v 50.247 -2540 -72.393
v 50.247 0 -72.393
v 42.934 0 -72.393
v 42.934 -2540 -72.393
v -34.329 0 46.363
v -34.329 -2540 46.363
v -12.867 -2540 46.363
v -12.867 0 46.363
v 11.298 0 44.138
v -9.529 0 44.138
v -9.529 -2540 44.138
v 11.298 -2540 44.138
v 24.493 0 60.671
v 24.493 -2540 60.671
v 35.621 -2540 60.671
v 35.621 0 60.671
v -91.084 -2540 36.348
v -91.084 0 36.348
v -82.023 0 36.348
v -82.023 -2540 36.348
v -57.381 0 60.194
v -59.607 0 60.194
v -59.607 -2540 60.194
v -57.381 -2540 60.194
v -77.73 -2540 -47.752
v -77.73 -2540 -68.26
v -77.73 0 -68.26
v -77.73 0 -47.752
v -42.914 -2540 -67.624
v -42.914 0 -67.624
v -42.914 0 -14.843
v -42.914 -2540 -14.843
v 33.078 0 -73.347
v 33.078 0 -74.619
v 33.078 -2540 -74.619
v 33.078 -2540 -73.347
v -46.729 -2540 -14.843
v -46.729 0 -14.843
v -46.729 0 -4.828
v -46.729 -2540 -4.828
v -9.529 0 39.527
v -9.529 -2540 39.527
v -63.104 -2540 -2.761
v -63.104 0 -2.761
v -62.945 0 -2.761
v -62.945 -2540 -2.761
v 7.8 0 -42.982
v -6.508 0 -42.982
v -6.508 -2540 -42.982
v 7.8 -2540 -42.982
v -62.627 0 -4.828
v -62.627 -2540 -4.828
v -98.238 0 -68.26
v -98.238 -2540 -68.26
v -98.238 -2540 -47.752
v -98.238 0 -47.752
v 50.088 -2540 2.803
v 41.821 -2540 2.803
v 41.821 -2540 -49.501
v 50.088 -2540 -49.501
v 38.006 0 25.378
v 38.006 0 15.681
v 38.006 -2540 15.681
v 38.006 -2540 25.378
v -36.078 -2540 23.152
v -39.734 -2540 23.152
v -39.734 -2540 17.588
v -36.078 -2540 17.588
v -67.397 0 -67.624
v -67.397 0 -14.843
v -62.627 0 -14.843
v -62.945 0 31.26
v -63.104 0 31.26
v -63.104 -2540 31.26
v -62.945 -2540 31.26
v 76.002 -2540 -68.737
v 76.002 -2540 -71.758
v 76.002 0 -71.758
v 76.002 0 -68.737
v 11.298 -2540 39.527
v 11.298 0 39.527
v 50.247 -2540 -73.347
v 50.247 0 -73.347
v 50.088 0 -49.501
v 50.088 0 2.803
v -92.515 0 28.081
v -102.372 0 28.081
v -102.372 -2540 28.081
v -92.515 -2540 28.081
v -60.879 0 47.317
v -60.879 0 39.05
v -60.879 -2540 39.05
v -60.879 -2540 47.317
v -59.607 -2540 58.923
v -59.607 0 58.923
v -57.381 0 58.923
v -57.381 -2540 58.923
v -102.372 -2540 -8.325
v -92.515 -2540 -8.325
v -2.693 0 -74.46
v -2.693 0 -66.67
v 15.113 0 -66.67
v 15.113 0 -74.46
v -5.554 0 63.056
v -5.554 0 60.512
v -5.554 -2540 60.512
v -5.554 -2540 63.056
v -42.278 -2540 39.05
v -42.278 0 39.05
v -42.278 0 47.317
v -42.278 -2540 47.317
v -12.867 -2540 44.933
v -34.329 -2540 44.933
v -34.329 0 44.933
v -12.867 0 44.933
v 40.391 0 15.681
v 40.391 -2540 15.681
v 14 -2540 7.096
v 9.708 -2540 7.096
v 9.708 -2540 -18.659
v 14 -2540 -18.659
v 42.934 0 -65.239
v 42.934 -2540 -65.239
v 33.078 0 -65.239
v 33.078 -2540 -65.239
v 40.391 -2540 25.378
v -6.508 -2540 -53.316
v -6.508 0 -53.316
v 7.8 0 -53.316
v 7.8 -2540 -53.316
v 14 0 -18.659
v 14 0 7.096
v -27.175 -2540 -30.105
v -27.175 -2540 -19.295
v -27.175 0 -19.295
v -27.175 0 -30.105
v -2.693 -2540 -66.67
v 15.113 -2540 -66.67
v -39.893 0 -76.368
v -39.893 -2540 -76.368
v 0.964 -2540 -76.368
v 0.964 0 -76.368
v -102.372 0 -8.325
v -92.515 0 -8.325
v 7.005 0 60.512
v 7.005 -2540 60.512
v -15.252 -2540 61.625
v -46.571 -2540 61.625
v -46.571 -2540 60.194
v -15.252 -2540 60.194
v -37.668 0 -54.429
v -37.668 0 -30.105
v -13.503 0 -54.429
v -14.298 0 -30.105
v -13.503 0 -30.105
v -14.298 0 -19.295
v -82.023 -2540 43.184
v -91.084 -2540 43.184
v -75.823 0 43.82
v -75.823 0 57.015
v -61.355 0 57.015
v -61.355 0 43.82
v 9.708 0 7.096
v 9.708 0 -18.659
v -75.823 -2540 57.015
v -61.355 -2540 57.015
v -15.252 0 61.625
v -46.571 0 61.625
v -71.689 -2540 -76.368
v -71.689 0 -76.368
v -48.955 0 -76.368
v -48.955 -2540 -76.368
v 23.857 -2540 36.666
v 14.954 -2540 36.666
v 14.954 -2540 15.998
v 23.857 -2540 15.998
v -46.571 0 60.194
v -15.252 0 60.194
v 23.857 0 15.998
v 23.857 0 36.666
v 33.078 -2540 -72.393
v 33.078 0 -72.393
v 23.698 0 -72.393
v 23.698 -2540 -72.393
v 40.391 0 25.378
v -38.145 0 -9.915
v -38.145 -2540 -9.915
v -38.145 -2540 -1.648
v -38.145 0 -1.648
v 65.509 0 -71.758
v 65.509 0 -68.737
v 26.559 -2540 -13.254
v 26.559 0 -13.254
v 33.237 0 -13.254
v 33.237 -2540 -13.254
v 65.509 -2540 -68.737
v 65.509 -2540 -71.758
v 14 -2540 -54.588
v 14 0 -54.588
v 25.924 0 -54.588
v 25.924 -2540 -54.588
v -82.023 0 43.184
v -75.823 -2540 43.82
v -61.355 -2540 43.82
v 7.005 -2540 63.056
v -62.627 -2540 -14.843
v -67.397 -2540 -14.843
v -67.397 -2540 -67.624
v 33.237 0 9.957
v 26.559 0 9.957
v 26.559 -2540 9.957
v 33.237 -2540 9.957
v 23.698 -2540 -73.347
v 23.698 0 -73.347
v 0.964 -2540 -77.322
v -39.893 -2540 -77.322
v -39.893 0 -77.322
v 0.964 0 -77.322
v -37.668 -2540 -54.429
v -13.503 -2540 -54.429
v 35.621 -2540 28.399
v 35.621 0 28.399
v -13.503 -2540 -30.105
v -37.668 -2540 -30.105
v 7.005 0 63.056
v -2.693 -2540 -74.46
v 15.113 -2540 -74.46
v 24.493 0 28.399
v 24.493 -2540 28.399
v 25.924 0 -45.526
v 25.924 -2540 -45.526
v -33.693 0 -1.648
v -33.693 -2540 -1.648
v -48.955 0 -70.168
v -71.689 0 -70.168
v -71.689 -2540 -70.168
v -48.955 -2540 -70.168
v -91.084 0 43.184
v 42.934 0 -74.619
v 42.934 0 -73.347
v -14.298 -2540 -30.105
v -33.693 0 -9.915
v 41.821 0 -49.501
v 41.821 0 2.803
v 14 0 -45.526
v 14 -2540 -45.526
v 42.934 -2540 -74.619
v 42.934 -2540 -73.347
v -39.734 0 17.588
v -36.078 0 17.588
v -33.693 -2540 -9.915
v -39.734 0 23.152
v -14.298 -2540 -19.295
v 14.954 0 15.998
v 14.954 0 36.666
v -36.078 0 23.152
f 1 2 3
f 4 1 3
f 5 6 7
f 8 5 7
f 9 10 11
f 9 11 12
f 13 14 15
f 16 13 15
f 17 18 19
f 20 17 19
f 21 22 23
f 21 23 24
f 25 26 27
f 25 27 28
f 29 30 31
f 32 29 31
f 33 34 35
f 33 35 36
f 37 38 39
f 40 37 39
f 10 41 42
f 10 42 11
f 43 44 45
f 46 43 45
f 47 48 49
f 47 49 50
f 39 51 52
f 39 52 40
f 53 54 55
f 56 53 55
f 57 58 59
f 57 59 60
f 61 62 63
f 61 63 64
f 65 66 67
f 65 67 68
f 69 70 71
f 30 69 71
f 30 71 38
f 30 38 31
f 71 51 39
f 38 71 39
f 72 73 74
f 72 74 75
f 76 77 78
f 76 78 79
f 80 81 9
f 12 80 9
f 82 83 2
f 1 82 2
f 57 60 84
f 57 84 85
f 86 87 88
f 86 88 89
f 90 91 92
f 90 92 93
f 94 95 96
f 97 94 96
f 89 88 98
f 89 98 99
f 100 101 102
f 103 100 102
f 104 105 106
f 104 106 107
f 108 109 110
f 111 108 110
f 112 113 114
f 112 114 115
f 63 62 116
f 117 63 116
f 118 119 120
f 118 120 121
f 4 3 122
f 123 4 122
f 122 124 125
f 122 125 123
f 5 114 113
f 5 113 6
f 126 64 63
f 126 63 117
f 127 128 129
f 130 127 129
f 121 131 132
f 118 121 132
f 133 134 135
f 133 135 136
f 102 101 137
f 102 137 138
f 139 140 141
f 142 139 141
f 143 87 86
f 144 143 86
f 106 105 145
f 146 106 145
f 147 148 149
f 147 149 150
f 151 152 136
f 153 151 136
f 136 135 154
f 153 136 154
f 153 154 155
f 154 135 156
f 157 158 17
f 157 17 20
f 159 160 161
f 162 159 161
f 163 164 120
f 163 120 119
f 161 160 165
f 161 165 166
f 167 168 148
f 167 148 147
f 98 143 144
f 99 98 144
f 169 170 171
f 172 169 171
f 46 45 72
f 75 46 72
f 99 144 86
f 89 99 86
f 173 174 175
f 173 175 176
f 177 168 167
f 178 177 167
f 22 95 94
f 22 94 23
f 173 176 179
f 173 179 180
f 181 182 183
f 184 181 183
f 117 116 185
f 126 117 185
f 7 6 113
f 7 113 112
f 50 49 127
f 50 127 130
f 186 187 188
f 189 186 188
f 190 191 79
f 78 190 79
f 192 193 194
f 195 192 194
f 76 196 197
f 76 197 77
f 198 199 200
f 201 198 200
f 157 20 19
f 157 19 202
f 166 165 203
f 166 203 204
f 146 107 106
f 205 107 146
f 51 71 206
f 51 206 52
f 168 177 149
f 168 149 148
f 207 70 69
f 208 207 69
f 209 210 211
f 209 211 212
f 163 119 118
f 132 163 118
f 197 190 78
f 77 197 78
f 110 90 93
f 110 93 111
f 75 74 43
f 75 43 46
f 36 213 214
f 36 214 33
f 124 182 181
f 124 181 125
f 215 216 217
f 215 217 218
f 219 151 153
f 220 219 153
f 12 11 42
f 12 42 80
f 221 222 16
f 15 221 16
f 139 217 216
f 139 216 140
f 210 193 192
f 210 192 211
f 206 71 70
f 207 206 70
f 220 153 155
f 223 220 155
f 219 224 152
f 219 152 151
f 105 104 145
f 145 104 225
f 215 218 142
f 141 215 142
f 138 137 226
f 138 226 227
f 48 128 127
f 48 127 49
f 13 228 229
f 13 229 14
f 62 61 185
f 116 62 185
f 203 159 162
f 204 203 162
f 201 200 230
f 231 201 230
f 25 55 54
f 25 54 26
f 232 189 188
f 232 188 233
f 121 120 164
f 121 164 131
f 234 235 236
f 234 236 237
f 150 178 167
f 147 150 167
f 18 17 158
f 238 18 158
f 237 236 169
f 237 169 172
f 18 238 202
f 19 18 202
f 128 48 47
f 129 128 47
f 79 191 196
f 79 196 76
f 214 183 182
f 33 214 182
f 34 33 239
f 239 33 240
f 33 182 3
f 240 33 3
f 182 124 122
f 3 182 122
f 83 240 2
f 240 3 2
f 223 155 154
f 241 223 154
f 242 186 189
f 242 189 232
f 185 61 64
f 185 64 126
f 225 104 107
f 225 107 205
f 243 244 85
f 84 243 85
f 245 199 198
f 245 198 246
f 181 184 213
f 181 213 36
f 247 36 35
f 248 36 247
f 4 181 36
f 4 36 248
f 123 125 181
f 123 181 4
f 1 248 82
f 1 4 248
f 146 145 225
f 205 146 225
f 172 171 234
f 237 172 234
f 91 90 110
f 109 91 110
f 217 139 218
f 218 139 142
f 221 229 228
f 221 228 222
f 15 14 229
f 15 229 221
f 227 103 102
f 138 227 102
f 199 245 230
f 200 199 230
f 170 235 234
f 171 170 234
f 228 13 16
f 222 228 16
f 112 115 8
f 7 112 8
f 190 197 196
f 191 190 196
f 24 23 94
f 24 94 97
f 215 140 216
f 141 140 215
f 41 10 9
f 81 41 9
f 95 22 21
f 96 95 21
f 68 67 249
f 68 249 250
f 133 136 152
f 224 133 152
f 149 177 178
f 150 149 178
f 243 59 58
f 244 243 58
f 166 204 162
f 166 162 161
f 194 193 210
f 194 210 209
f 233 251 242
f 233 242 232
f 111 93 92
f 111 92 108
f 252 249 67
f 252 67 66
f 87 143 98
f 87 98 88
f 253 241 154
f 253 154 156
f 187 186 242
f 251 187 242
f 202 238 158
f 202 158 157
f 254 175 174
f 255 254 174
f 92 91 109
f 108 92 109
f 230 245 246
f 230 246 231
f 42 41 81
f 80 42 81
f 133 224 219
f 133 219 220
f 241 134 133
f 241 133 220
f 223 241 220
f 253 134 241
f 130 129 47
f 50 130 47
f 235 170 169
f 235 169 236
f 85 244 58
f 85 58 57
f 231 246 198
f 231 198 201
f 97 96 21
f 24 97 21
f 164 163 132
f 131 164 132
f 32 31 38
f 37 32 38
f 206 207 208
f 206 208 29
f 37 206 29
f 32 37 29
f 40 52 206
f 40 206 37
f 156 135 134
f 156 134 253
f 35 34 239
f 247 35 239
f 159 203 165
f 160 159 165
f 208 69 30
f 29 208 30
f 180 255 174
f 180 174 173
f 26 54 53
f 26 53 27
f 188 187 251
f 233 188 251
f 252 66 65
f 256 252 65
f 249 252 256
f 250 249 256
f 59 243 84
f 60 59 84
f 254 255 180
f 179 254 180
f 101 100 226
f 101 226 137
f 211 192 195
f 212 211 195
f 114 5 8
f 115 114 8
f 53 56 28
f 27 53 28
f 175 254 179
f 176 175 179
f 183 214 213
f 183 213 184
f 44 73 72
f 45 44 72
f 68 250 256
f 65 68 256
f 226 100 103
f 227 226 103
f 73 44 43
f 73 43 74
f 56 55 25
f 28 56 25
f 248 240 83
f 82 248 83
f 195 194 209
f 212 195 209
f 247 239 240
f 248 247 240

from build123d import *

# Parameters (mm, degrees)
F0_W     = 15.897821635
F0_H     = 10.0156273693
F0_H_2   = 5.2462806925
F1_DEPTH = 2540
F0_W_2   = 4.2924117297
F0_H_3   = 25.7544722408
F0_W_3   = 3.6564953625
F0_H_4   = 5.5642370135
F0_W_4   = 4.4513903558
F0_H_5   = 8.2668672549
F0_W_5   = 12.8772351891
F0_H_6   = 10.8105186373
F0_H_7   = 8.1078913063
F0_W_6   = 14.3080395646
F0_H_8   = 10.3335864842
F0_W_7   = 11.9233652949
F0_H_9   = 9.0617574751
F0_W_8   = 6.6770873964
F0_H_10  = 23.2108188793
F0_W_9   = 8.9027797803
F0_H_11  = 20.6671673805
F0_W_10  = 20.8261450753
F0_H_12  = 4.6103671193
F0_W_11  = 21.4620586485
F0_H_13  = 1.4308020473
F0_W_12  = 18.600448966
F0_H_14  = 8.2668662071
F0_W_13  = 0.1589804888
F0_H_15  = 34.0213391464
F0_W_14  = 17.8055600263
F0_H_16  = 7.789939642
F0_W_15  = 9.8566487432
F0_H_17  = 1.2718290091
F0_W_16  = 9.3797128648
F0_H_18  = 0.9538680315
F0_W_17  = 7.3130019009
F0_H_19  = 7.1540251374
F0_W_18  = 8.2668662071
F0_H_20  = 52.303835284
F0_W_19  = 2.384673804
F0_H_21  = 9.6976719797
F0_W_20  = 11.1284777522
F0_H_22  = 32.2725791484
F0_W_21  = 12.5592797995
F0_H_23  = 2.5436505675
F0_W_22  = 31.3187073916
F0_W_23  = 2.2256933153
F0_H_24  = 1.2718252838
F0_W_24  = 14.4670121372
F0_H_25  = 13.1951905787
F0_W_25  = 9.0617612004
F0_H_26  = 6.8360604346
F0_W_26  = 9.8566561937
F0_H_27  = 36.4060113207
F0_W_27  = 20.5081924796
F0_H_28  = 20.508185029
F0_W_28  = 22.7338820696
F0_H_29  = 6.2001496553
F0_W_29  = 40.8574024914
F0_H_30  = 0.9538754821
F0_W_30  = 10.4925632477
F0_H_31  = 3.0205845833


with BuildPart() as f1:
    # F0 (on Front) → F1 (new body)
    with BuildSketch(Plane.XZ):
        Polygon((-62.6273155212, -14.8433083668), (-67.3966631293, -14.8433083668), (-67.3966631293, -67.6240772009), (-42.9140143096, -67.6240772009), (-42.9140143096, -14.8433083668), (-46.7294938862, -14.8433083668), (-46.7294938862, -20.0895890594), (-62.6273155212, -20.0895890594), align=None)
        with Locations((-54.6784047037, -9.8354946822)):
            Rectangle(F0_W, F0_H)
        with Locations((-54.6784047037, -17.4664487131)):
            Rectangle(F0_W, F0_H_2)
    extrude(amount=F1_DEPTH)


with BuildPart() as f1b:
    # F0 (on Front) → F1, piece 2 (new body)
    with BuildSketch(Plane.XZ):
        with Locations((11.8539808318, -5.7815508917)):
            Rectangle(F0_W_2, F0_H_3)
    extrude(amount=F1_DEPTH)


with BuildPart() as f1c:
    # F0 (on Front) → F1, piece 3 (new body)
    with BuildSketch(Plane.XZ):
        with Locations((-37.9062015563, 20.3703669831)):
            Rectangle(F0_W_3, F0_H_4)
    extrude(amount=F1_DEPTH)


with BuildPart() as f1d:
    # F0 (on Front) → F1, piece 4 (new body)
    with BuildSketch(Plane.XZ):
        with Locations((-35.9189752489, -5.7815503678)):
            Rectangle(F0_W_4, F0_H_5)
    extrude(amount=F1_DEPTH)


with BuildPart() as f1e:
    # F0 (on Front) → F1, piece 5 (new body)
    with BuildSketch(Plane.XZ):
        with Locations((-20.7365537062, -24.69995711)):
            Rectangle(F0_W_5, F0_H_6)
        with Locations((-20.7365537062, -34.1591620818)):
            Rectangle(F0_W_5, F0_H_7)
        Polygon((-27.1751713008, -38.2131077349), (-27.1751713008, -30.1052164286), (-37.6677326858, -30.1052164286), (-37.6677326858, -54.4288828969), (-13.5030448437, -54.4288828969), (-13.5030448437, -30.1052164286), (-14.2979361117, -30.1052164286), (-14.2979361117, -38.2131077349), align=None)
    extrude(amount=F1_DEPTH)


with BuildPart() as f1f:
    # F0 (on Front) → F1, piece 6 (new body)
    with BuildSketch(Plane.XZ):
        with Locations((0.6460163277, -48.1492448598)):
            Rectangle(F0_W_6, F0_H_8)
    extrude(amount=F1_DEPTH)


with BuildPart() as f1g:
    # F0 (on Front) → F1, piece 7 (new body)
    with BuildSketch(Plane.XZ):
        with Locations((19.9618693441, -50.0569809228)):
            Rectangle(F0_W_7, F0_H_9)
    extrude(amount=F1_DEPTH)


with BuildPart() as f1h:
    # F0 (on Front) → F1, piece 8 (new body)
    with BuildSketch(Plane.XZ):
        with Locations((29.8980083317, -1.6481173225)):
            Rectangle(F0_W_8, F0_H_10)
    extrude(amount=F1_DEPTH)


with BuildPart() as f1i:
    # F0 (on Front) → F1, piece 9 (new body)
    with BuildSketch(Plane.XZ):
        with Locations((19.4054455496, 26.3320496306)):
            Rectangle(F0_W_9, F0_H_11)
    extrude(amount=F1_DEPTH)


with BuildPart() as f1j:
    # F0 (on Front) → F1, piece 10 (new body)
    with BuildSketch(Plane.XZ):
        with Locations((0.8844831027, 41.8324247003)):
            Rectangle(F0_W_10, F0_H_12)
    extrude(amount=F1_DEPTH)


with BuildPart() as f1k:
    # F0 (on Front) → F1, piece 11 (new body)
    with BuildSketch(Plane.XZ):
        with Locations((-23.598161526, 45.6479042768)):
            Rectangle(F0_W_11, F0_H_13)
    extrude(amount=F1_DEPTH)


with BuildPart() as f1l:
    # F0 (on Front) → F1, piece 12 (new body)
    with BuildSketch(Plane.XZ):
        with Locations((-51.5783280134, 43.1837402284)):
            Rectangle(F0_W_12, F0_H_14)
    extrude(amount=F1_DEPTH)


with BuildPart() as f1m:
    # F0 (on Front) → F1, piece 13 (new body)
    with BuildSketch(Plane.XZ):
        with Locations((-63.0247592926, 14.2497053603)):
            Rectangle(F0_W_13, F0_H_15)
    extrude(amount=F1_DEPTH)


with BuildPart() as f1n:
    # F0 (on Front) → F1, piece 14 (new body)
    with BuildSketch(Plane.XZ):
        with Locations((6.2102533411, -70.5651715398)):
            Rectangle(F0_W_14, F0_H_16)
    extrude(amount=F1_DEPTH)


with BuildPart() as f1o:
    # F0 (on Front) → F1, piece 15 (new body)
    with BuildSketch(Plane.XZ):
        with Locations((38.0058959126, -73.983207345)):
            Rectangle(F0_W_15, F0_H_17)
        with Locations((28.3877151087, -72.8703588247)):
            Rectangle(F0_W_16, F0_H_18)
        with Locations((38.0058959126, -72.8703588247)):
            Rectangle(F0_W_15, F0_H_18)
        with Locations((46.5907212347, -72.8703588247)):
            Rectangle(F0_W_17, F0_H_18)
        with Locations((38.0058959126, -68.8164122403)):
            Rectangle(F0_W_15, F0_H_19)
    extrude(amount=F1_DEPTH)


with BuildPart() as f1p:
    # F0 (on Front) → F1, piece 16 (new body)
    with BuildSketch(Plane.XZ):
        with Locations((45.9548085928, -23.3486446086)):
            Rectangle(F0_W_18, F0_H_20)
    extrude(amount=F1_DEPTH)


with BuildPart() as f1q:
    # F0 (on Front) → F1, piece 17 (new body)
    with BuildSketch(Plane.XZ):
        with Locations((39.1982328147, 20.5293446779)):
            Rectangle(F0_W_19, F0_H_21)
    extrude(amount=F1_DEPTH)


with BuildPart() as f1r:
    # F0 (on Front) → F1, piece 18 (new body)
    with BuildSketch(Plane.XZ):
        with Locations((30.0569869578, 44.5350548252)):
            Rectangle(F0_W_20, F0_H_22)
    extrude(amount=F1_DEPTH)


with BuildPart() as f1s:
    # F0 (on Front) → F1, piece 19 (new body)
    with BuildSketch(Plane.XZ):
        with Locations((0.7255054079, 61.7841891944)):
            Rectangle(F0_W_21, F0_H_23)
    extrude(amount=F1_DEPTH)


with BuildPart() as f1t:
    # F0 (on Front) → F1, piece 20 (new body)
    with BuildSketch(Plane.XZ):
        with Locations((-30.9111597016, 60.9098114073)):
            Rectangle(F0_W_22, F0_H_13)
    extrude(amount=F1_DEPTH)


with BuildPart() as f1u:
    # F0 (on Front) → F1, piece 21 (new body)
    with BuildSketch(Plane.XZ):
        with Locations((-58.493880555, 59.5584977418)):
            Rectangle(F0_W_23, F0_H_24)
    extrude(amount=F1_DEPTH)


with BuildPart() as f1v:
    # F0 (on Front) → F1, piece 22 (new body)
    with BuildSketch(Plane.XZ):
        with Locations((-68.5889963061, 50.4172500223)):
            Rectangle(F0_W_24, F0_H_25)
    extrude(amount=F1_DEPTH)


with BuildPart() as f1w:
    # F0 (on Front) → F1, piece 23 (new body)
    with BuildSketch(Plane.XZ):
        with Locations((-86.5535326302, 39.7657062858)):
            Rectangle(F0_W_25, F0_H_26)
    extrude(amount=F1_DEPTH)


with BuildPart() as f1x:
    # F0 (on Front) → F1, piece 24 (new body)
    with BuildSketch(Plane.XZ):
        with Locations((-97.4435433745, 9.8778042011)):
            Rectangle(F0_W_26, F0_H_27)
    extrude(amount=F1_DEPTH)


with BuildPart() as f1y:
    # F0 (on Front) → F1, piece 25 (new body)
    with BuildSketch(Plane.XZ):
        with Locations((-87.984342128, -58.0058917403)):
            Rectangle(F0_W_27, F0_H_28)
    extrude(amount=F1_DEPTH)


with BuildPart() as f1z:
    # F0 (on Front) → F1, piece 26 (new body)
    with BuildSketch(Plane.XZ):
        with Locations((-60.3221282363, -73.2678025961)):
            Rectangle(F0_W_28, F0_H_29)
    extrude(amount=F1_DEPTH)


with BuildPart() as f1ba:
    # F0 (on Front) → F1, piece 27 (new body)
    with BuildSketch(Plane.XZ):
        with Locations((-19.4647284807, -76.8448151648)):
            Rectangle(F0_W_29, F0_H_30)
    extrude(amount=F1_DEPTH)


with BuildPart() as f1bb:
    # F0 (on Front) → F1, piece 28 (new body)
    with BuildSketch(Plane.XZ):
        with Locations((70.7554072142, -70.2472180128)):
            Rectangle(F0_W_30, F0_H_31)
    extrude(amount=F1_DEPTH)


solid = Compound([f1.part, f1b.part, f1c.part, f1d.part, f1e.part, f1f.part, f1g.part, f1h.part, f1i.part, f1j.part, f1k.part, f1l.part, f1m.part, f1n.part, f1o.part, f1p.part, f1q.part, f1r.part, f1s.part, f1t.part, f1u.part, f1v.part, f1w.part, f1x.part, f1y.part, f1z.part, f1ba.part, f1bb.part])
